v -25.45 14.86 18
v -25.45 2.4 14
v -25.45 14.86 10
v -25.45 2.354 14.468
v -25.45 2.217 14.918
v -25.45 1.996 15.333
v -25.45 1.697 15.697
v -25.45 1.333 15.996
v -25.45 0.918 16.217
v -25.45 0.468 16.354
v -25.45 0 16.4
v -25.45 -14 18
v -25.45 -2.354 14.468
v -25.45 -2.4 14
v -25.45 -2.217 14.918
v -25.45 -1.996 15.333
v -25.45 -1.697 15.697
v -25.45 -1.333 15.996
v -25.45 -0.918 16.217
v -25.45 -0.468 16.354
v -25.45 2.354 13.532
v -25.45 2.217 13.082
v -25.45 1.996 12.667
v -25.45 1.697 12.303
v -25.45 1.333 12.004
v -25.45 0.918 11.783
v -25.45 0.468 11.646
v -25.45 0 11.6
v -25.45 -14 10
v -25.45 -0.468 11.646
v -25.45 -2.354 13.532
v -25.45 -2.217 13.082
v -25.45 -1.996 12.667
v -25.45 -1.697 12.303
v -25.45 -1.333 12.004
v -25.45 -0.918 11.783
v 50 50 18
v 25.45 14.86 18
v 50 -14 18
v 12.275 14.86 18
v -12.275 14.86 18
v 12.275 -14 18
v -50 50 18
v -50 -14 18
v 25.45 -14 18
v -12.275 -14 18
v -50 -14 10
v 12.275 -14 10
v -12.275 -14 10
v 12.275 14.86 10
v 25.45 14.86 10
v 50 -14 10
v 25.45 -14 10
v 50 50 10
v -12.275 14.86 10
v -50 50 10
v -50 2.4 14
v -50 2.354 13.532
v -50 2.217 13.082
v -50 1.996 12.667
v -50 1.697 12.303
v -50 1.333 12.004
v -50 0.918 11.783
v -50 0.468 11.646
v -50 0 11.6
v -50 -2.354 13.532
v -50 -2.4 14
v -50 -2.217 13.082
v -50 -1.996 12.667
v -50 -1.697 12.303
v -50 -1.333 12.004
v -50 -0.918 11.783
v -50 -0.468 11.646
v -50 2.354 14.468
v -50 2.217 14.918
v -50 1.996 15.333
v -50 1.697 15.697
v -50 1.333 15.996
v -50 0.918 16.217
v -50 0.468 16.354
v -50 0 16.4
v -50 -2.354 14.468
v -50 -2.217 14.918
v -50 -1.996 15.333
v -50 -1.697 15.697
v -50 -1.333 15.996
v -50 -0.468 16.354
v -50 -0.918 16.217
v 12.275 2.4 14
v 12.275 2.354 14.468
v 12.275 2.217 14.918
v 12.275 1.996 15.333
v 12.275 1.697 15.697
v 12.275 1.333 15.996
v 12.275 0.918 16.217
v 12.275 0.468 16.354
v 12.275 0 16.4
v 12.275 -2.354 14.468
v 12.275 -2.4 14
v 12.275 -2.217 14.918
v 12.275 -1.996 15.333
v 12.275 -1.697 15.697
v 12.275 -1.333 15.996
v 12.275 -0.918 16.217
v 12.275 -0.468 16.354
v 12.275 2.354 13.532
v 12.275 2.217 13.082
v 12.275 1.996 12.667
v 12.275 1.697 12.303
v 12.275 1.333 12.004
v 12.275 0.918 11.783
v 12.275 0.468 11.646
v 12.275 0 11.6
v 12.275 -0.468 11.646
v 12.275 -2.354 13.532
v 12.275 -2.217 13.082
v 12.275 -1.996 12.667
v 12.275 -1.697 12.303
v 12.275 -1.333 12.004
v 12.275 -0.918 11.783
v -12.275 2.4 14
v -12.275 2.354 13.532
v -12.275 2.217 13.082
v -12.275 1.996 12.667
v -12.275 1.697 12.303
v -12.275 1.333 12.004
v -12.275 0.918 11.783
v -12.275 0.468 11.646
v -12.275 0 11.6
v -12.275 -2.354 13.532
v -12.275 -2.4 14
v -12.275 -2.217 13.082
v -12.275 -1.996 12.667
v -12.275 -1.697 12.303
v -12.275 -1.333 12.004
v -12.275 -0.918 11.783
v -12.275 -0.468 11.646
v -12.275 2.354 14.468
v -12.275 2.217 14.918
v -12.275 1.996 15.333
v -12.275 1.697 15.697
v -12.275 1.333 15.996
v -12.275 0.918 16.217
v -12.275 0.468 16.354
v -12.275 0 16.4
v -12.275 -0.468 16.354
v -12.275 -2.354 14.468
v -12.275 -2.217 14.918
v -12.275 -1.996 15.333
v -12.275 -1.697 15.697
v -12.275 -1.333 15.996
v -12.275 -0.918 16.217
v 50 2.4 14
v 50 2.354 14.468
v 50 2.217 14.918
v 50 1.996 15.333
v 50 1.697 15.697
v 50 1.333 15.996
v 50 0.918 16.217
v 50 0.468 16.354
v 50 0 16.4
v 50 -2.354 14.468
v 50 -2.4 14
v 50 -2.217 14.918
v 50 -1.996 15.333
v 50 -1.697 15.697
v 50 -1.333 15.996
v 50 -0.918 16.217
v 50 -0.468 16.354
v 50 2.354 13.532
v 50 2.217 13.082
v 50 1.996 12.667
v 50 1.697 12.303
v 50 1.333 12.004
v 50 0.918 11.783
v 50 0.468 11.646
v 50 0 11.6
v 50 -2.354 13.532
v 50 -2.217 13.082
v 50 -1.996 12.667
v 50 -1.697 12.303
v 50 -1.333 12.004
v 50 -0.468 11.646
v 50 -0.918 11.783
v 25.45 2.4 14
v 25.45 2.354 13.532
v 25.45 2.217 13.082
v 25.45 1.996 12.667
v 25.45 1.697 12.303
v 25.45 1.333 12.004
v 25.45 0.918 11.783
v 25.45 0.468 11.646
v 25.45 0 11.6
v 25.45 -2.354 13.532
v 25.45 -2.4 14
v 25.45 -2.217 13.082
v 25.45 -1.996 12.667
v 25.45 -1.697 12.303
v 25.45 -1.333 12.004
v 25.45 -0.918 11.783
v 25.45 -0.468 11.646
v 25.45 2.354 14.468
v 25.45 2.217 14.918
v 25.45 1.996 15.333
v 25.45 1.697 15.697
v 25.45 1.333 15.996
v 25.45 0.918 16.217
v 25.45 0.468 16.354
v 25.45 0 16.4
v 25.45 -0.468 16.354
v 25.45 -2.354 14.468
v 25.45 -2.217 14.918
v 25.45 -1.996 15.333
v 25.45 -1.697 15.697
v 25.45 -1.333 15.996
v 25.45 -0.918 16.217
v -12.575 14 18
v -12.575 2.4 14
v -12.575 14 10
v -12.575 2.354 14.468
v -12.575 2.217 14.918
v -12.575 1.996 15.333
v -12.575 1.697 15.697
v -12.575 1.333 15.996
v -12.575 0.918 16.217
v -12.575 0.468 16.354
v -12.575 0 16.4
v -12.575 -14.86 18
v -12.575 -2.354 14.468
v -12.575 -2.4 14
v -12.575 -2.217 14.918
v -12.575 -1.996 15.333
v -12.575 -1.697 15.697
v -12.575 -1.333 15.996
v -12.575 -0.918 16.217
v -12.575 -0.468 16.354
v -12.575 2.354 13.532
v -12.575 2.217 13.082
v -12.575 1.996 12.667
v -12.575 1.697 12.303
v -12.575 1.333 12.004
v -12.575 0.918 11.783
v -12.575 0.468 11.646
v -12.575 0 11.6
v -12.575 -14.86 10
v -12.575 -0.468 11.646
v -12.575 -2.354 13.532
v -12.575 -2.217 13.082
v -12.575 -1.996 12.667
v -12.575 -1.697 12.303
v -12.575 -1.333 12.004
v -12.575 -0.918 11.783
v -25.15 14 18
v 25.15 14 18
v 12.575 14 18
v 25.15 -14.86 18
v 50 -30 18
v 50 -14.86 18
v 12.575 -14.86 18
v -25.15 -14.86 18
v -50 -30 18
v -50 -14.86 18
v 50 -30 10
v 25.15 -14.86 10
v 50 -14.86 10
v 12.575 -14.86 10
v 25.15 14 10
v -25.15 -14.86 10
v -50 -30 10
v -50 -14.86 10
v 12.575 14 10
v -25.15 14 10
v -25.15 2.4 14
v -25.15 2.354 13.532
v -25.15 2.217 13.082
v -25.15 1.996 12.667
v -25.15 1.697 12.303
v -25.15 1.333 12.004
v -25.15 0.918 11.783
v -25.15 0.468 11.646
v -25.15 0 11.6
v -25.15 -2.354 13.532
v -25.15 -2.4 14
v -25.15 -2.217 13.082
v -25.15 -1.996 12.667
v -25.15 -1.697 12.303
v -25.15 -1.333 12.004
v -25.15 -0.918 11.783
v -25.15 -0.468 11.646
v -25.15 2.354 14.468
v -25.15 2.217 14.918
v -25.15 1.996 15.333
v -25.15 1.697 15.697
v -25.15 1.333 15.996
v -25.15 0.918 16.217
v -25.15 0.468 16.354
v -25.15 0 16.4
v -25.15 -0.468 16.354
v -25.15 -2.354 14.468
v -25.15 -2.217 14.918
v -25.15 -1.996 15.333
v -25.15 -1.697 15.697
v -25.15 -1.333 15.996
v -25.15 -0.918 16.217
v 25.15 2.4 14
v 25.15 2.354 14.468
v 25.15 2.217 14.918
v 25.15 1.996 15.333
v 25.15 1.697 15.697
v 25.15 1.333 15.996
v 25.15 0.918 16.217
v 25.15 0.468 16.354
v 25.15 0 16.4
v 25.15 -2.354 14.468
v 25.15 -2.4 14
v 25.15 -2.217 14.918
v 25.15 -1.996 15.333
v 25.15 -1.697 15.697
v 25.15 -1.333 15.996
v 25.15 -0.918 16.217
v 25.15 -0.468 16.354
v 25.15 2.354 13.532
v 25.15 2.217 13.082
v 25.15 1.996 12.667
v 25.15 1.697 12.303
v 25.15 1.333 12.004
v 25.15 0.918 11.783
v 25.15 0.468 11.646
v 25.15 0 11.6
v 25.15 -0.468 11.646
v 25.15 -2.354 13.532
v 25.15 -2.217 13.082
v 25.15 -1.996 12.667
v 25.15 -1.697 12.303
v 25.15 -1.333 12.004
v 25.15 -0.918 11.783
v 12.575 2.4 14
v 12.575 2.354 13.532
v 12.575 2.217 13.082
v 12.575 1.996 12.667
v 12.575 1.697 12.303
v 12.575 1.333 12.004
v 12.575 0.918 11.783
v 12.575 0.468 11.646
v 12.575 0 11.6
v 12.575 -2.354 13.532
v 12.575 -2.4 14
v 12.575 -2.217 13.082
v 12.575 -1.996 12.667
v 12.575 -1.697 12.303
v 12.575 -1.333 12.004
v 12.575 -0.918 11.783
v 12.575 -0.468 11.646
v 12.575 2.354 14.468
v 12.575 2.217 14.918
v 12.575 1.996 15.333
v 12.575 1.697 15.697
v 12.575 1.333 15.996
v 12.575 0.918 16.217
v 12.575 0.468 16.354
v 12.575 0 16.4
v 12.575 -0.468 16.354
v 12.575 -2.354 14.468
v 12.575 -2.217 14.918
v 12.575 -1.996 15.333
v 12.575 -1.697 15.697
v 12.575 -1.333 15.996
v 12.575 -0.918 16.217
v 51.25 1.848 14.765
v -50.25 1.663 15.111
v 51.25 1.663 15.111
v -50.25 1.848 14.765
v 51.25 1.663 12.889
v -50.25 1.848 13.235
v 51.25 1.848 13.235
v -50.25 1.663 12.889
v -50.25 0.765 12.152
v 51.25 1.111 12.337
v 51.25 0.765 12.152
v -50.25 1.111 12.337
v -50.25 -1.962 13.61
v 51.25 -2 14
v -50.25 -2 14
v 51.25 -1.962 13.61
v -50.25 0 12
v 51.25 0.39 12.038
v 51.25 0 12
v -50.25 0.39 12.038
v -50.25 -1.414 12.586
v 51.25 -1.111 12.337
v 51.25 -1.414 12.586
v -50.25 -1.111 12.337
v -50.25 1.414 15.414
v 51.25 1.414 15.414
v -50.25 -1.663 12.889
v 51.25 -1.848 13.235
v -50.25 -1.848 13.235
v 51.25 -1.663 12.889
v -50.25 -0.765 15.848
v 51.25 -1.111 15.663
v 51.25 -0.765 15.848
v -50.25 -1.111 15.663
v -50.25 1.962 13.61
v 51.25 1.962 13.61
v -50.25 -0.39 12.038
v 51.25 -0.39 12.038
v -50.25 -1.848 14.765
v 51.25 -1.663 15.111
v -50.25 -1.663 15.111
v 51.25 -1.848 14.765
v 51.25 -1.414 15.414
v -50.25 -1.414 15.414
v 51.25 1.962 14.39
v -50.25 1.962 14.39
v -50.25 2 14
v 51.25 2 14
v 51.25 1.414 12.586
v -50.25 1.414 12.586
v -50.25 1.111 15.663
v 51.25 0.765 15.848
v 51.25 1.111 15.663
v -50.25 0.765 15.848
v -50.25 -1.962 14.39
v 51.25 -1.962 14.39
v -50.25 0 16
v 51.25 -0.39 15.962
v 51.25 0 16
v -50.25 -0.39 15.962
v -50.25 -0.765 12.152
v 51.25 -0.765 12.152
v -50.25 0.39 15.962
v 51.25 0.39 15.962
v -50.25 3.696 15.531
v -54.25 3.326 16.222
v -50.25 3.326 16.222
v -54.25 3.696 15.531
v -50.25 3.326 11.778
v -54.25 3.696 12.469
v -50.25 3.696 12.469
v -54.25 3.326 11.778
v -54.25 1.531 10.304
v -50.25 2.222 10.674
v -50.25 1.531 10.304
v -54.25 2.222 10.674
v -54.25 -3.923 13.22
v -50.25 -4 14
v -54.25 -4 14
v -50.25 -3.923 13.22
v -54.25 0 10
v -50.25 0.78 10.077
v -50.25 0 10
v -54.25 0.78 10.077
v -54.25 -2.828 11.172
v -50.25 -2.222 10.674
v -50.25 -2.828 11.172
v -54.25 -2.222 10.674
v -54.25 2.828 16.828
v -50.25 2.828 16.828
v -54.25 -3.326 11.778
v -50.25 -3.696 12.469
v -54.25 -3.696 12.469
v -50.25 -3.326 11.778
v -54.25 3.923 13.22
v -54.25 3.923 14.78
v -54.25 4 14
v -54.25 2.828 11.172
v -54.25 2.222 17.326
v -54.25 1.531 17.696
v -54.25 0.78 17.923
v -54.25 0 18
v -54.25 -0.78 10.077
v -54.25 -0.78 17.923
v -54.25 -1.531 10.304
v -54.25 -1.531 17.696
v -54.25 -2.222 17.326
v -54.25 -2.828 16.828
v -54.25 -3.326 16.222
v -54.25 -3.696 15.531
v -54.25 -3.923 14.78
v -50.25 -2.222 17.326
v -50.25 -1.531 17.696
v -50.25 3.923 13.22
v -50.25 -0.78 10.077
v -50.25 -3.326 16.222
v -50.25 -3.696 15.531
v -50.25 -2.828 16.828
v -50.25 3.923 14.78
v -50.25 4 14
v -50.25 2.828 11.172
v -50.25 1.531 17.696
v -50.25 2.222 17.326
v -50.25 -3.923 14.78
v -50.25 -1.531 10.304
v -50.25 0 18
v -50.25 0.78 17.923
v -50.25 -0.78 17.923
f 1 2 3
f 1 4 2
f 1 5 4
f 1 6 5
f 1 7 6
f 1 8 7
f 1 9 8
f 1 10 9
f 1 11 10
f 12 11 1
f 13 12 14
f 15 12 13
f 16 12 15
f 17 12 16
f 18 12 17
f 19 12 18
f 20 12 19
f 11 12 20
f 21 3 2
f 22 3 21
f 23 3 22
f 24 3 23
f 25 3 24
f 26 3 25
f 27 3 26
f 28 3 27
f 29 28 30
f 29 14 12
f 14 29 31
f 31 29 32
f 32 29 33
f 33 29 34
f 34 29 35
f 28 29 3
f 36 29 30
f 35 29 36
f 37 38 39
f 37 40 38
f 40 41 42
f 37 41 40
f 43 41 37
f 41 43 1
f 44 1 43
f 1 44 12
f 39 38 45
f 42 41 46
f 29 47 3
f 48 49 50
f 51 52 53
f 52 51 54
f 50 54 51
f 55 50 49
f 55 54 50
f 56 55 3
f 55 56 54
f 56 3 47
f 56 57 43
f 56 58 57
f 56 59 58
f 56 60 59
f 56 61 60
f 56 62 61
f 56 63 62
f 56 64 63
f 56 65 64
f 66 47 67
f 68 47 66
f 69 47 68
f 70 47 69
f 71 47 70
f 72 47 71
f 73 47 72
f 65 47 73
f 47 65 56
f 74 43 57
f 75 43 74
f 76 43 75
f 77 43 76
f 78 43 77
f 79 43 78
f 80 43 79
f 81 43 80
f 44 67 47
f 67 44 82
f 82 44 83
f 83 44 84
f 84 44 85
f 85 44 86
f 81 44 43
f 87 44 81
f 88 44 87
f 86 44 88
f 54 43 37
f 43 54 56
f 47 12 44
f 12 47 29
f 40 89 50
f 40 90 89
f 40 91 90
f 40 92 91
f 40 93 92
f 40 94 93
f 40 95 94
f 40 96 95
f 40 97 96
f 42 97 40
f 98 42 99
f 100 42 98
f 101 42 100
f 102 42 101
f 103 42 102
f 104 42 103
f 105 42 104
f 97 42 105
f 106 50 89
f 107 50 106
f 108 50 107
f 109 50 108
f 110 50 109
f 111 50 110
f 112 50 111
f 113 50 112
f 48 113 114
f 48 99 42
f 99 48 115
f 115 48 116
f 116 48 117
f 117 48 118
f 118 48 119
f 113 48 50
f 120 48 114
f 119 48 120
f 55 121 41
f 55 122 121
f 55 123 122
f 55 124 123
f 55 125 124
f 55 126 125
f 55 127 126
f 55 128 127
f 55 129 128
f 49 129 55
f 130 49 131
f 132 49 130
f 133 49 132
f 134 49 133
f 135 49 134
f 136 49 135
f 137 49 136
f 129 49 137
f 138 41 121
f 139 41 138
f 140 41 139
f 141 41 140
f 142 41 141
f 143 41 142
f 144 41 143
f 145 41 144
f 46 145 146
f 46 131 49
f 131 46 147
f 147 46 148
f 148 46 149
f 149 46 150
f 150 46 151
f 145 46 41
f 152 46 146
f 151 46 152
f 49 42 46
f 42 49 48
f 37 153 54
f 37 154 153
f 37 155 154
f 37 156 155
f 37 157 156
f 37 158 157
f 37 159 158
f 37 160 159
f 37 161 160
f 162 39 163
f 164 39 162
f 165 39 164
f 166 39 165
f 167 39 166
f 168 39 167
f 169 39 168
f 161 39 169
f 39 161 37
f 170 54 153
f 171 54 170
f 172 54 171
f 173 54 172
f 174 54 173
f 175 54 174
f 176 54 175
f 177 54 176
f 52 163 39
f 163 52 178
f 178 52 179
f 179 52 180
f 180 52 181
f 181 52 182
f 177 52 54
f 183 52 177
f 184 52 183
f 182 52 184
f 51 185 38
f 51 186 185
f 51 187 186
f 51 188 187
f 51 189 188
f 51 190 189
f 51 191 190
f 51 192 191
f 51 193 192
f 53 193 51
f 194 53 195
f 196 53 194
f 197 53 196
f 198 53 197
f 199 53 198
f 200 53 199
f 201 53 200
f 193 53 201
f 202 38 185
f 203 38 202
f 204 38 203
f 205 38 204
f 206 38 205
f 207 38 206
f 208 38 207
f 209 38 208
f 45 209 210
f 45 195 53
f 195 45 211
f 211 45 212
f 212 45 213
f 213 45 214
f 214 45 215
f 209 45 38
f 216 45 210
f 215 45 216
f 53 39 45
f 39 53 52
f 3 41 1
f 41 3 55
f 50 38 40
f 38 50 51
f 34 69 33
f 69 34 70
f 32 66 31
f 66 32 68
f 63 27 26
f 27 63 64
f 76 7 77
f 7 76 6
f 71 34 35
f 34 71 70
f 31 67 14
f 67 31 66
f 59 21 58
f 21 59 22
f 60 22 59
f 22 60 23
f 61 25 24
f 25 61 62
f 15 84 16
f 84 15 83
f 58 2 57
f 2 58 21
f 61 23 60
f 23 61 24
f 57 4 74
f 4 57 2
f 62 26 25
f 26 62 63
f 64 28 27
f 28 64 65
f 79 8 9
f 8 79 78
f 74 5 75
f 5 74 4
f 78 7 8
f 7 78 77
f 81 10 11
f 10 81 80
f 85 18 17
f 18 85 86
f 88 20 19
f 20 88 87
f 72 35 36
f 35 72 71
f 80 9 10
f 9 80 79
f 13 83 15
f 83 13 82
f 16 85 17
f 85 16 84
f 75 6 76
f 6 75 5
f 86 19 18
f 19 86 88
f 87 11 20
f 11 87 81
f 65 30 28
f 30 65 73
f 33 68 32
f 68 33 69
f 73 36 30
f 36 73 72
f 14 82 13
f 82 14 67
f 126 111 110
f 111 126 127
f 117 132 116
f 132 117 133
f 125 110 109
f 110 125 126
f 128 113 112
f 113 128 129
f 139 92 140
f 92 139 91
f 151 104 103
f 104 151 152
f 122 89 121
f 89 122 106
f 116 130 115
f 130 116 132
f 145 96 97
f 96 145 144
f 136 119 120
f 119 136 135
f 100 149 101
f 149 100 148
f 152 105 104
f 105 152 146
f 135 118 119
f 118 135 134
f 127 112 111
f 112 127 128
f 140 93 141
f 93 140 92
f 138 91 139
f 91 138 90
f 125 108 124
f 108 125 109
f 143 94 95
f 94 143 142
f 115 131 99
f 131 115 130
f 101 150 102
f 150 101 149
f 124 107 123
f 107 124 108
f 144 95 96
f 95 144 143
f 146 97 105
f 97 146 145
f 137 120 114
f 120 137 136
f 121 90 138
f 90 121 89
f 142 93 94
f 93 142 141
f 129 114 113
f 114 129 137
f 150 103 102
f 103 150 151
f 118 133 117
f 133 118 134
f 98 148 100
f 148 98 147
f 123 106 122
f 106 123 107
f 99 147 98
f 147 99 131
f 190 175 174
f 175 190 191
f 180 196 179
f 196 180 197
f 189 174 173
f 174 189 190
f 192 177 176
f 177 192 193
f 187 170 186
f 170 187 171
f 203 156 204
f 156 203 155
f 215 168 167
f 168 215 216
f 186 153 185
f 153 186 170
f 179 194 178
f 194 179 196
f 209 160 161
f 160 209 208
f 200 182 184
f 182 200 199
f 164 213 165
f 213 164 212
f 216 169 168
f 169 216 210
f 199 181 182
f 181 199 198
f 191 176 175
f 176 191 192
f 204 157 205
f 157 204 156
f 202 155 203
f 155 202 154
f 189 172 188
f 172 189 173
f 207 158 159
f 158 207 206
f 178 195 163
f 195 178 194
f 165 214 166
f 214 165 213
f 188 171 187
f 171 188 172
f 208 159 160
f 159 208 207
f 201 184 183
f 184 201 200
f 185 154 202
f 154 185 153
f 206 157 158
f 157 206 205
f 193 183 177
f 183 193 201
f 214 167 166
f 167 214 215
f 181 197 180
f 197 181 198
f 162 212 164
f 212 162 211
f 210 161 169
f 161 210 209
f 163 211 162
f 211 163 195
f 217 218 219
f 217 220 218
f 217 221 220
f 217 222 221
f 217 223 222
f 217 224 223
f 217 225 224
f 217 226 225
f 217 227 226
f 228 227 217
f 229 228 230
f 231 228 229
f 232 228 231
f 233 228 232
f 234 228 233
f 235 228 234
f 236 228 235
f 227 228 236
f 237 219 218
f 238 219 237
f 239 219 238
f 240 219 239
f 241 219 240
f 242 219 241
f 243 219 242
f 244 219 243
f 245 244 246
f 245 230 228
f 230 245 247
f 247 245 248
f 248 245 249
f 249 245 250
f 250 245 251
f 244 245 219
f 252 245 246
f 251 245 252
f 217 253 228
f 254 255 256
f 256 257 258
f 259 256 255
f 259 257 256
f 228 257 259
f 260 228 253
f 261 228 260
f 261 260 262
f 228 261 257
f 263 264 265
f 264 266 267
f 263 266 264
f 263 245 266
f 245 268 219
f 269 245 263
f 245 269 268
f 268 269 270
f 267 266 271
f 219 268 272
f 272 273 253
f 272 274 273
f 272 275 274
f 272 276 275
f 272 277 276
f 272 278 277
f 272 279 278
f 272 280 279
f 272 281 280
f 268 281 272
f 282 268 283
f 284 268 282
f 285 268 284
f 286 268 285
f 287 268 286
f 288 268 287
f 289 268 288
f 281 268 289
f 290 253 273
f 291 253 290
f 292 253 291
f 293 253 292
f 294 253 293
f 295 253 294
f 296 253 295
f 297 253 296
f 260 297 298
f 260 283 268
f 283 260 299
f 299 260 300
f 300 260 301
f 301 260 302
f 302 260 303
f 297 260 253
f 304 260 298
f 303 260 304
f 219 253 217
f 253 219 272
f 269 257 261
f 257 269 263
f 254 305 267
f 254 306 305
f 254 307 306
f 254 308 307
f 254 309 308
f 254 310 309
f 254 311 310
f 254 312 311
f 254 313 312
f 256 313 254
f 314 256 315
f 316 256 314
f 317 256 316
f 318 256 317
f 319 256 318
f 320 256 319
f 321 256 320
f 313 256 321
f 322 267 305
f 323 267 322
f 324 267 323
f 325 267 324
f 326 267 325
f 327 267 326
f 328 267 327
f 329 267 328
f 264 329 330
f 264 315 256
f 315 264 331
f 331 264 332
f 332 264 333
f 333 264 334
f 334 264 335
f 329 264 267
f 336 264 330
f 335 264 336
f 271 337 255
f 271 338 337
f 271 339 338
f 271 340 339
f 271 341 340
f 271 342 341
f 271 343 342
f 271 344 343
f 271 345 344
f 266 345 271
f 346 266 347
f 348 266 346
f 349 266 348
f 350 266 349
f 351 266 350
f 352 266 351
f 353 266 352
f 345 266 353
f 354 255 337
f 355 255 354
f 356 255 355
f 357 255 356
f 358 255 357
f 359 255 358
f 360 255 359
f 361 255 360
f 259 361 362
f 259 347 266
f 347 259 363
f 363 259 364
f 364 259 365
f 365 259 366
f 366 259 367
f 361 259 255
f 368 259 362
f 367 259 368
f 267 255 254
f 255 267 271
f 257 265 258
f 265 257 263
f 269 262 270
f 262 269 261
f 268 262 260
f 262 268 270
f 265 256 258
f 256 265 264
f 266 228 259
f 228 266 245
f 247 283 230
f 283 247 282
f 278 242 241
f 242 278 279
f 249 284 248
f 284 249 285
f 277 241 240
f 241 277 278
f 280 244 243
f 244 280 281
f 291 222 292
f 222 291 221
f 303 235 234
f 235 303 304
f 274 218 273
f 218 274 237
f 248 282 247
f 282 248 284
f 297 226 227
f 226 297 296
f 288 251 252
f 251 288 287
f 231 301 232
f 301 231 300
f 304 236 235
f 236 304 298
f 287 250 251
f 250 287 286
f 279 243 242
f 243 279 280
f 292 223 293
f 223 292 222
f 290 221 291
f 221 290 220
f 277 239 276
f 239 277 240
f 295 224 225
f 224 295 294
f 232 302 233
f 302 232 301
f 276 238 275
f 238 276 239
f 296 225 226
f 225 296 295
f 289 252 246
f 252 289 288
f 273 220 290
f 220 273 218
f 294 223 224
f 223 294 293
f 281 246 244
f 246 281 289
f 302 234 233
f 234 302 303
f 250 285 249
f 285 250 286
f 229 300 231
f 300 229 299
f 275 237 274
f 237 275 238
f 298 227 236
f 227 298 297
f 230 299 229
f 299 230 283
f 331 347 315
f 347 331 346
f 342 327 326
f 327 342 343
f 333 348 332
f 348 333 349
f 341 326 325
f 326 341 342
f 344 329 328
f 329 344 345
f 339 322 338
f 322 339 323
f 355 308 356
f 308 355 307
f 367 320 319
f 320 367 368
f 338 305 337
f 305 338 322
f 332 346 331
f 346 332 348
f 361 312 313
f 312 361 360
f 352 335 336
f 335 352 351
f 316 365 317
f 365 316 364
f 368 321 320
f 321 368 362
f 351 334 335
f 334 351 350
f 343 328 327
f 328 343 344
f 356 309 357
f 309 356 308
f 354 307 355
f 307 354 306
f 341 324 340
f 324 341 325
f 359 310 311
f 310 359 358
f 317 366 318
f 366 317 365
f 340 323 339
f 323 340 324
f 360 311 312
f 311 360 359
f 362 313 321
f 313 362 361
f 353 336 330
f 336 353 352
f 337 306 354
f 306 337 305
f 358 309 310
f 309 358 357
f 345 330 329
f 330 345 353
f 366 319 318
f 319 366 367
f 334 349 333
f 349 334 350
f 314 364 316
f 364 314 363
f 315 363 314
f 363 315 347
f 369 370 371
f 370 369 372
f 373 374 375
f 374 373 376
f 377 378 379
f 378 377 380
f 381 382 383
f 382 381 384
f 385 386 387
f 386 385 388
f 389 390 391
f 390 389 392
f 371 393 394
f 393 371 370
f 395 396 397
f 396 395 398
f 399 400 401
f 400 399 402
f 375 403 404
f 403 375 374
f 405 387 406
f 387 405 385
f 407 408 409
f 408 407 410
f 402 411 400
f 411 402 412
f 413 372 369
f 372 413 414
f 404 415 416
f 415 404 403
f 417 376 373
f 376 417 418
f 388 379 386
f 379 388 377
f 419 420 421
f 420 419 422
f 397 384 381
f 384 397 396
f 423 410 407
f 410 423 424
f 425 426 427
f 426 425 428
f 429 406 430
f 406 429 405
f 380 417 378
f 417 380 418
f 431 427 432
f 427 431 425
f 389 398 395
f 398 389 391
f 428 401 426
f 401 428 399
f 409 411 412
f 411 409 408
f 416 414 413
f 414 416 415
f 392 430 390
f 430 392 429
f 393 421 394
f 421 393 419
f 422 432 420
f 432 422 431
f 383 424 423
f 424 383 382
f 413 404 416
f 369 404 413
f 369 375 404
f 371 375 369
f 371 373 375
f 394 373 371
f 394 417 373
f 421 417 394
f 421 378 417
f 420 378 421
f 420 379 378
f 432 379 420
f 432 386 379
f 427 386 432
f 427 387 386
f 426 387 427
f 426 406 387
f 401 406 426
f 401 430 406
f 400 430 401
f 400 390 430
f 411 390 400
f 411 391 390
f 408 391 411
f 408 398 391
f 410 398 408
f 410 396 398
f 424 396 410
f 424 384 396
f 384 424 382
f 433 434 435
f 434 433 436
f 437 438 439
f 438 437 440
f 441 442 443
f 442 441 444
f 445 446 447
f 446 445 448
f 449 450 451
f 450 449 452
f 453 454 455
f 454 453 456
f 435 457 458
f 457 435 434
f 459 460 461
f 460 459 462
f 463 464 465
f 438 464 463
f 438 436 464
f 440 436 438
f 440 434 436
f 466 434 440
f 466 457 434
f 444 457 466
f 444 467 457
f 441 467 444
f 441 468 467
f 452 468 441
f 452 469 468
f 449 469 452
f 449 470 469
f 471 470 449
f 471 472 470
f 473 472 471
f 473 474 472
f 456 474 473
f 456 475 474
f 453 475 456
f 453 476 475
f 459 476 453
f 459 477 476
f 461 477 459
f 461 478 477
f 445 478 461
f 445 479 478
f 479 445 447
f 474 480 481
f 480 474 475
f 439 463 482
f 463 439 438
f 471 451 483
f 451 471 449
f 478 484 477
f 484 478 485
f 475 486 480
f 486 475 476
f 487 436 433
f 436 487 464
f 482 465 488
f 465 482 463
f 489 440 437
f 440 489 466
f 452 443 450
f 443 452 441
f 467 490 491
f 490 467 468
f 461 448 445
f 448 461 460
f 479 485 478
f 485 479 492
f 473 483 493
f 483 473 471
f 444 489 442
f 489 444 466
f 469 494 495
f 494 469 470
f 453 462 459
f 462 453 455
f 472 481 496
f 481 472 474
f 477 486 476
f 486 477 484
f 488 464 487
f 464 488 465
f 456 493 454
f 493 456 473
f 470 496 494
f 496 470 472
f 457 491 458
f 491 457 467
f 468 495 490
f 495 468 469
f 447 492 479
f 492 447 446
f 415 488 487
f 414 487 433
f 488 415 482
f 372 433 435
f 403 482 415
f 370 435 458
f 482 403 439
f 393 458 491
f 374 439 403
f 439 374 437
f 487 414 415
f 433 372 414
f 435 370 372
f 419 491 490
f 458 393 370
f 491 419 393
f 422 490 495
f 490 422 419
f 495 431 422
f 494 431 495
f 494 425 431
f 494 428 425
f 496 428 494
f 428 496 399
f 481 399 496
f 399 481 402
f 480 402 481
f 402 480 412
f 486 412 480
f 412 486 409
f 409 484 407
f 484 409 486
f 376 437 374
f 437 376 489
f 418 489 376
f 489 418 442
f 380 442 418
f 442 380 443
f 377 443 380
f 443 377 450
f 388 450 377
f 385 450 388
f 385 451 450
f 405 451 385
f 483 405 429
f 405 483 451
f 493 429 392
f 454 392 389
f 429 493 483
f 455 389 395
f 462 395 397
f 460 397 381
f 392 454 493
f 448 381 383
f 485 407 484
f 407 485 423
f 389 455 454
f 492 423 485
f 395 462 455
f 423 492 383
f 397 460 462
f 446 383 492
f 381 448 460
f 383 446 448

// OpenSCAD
$fn = 32;

// ------------------------------------------------------------------------
// Butt hinge: hinge 100 mm, leaf swung 0 deg
// Every part is its own module, assembly() places every instance.
// ------------------------------------------------------------------------

// --- part 1 ---
module hinge_base() {
  difference() {
    union() {
      translate([-50, -14, -4]) cube([24.55, 64, 8]);
      translate([-12.275, -14, -4]) cube([24.55, 64, 8]);
      translate([25.45, -14, -4]) cube([24.55, 64, 8]);
      translate([-50, 14.86, -4]) cube([100, 35.14, 8]);
    }
    translate([-37.725, 0, 0]) rotate([0, 90, 0]) cylinder(h = 26.55, d = 4.8, center = true);
    translate([0, 0, 0]) rotate([0, 90, 0]) cylinder(h = 26.55, d = 4.8, center = true);
    translate([37.725, 0, 0]) rotate([0, 90, 0]) cylinder(h = 26.55, d = 4.8, center = true);
  }
}

// --- part 2 ---
module hinge_mover() {
  difference() {
    union() {
      translate([-25.15, -30, -4]) cube([12.575, 44, 8]);
      translate([12.575, -30, -4]) cube([12.575, 44, 8]);
      translate([-50, -30, -4]) cube([100, 15.14, 8]);
    }
    translate([-18.863, 0, 0]) rotate([0, 90, 0]) cylinder(h = 14.575, d = 4.8, center = true);
    translate([18.863, 0, 0]) rotate([0, 90, 0]) cylinder(h = 14.575, d = 4.8, center = true);
  }
}

// --- part 3 ---
module hinge_pin() {
  rotate([0, 90, 0]) cylinder(h = 102.5, d = 4, center = true);
  translate([-54.25, 0, 0]) rotate([0, 90, 0]) cylinder(h = 4, d = 8);
}

// --- assembly ---
module assembly() {
  color([0.80, 0.24, 0.20]) translate([0, 0, 14]) rotate([0, 0, 0]) hinge_base();
  color([0.20, 0.45, 0.75]) translate([0, 0, 14]) rotate([0, 0, 0]) hinge_mover();
  color([0.25, 0.62, 0.32]) translate([0, 0, 14]) rotate([0, 0, 0]) hinge_pin();
}

assembly();
